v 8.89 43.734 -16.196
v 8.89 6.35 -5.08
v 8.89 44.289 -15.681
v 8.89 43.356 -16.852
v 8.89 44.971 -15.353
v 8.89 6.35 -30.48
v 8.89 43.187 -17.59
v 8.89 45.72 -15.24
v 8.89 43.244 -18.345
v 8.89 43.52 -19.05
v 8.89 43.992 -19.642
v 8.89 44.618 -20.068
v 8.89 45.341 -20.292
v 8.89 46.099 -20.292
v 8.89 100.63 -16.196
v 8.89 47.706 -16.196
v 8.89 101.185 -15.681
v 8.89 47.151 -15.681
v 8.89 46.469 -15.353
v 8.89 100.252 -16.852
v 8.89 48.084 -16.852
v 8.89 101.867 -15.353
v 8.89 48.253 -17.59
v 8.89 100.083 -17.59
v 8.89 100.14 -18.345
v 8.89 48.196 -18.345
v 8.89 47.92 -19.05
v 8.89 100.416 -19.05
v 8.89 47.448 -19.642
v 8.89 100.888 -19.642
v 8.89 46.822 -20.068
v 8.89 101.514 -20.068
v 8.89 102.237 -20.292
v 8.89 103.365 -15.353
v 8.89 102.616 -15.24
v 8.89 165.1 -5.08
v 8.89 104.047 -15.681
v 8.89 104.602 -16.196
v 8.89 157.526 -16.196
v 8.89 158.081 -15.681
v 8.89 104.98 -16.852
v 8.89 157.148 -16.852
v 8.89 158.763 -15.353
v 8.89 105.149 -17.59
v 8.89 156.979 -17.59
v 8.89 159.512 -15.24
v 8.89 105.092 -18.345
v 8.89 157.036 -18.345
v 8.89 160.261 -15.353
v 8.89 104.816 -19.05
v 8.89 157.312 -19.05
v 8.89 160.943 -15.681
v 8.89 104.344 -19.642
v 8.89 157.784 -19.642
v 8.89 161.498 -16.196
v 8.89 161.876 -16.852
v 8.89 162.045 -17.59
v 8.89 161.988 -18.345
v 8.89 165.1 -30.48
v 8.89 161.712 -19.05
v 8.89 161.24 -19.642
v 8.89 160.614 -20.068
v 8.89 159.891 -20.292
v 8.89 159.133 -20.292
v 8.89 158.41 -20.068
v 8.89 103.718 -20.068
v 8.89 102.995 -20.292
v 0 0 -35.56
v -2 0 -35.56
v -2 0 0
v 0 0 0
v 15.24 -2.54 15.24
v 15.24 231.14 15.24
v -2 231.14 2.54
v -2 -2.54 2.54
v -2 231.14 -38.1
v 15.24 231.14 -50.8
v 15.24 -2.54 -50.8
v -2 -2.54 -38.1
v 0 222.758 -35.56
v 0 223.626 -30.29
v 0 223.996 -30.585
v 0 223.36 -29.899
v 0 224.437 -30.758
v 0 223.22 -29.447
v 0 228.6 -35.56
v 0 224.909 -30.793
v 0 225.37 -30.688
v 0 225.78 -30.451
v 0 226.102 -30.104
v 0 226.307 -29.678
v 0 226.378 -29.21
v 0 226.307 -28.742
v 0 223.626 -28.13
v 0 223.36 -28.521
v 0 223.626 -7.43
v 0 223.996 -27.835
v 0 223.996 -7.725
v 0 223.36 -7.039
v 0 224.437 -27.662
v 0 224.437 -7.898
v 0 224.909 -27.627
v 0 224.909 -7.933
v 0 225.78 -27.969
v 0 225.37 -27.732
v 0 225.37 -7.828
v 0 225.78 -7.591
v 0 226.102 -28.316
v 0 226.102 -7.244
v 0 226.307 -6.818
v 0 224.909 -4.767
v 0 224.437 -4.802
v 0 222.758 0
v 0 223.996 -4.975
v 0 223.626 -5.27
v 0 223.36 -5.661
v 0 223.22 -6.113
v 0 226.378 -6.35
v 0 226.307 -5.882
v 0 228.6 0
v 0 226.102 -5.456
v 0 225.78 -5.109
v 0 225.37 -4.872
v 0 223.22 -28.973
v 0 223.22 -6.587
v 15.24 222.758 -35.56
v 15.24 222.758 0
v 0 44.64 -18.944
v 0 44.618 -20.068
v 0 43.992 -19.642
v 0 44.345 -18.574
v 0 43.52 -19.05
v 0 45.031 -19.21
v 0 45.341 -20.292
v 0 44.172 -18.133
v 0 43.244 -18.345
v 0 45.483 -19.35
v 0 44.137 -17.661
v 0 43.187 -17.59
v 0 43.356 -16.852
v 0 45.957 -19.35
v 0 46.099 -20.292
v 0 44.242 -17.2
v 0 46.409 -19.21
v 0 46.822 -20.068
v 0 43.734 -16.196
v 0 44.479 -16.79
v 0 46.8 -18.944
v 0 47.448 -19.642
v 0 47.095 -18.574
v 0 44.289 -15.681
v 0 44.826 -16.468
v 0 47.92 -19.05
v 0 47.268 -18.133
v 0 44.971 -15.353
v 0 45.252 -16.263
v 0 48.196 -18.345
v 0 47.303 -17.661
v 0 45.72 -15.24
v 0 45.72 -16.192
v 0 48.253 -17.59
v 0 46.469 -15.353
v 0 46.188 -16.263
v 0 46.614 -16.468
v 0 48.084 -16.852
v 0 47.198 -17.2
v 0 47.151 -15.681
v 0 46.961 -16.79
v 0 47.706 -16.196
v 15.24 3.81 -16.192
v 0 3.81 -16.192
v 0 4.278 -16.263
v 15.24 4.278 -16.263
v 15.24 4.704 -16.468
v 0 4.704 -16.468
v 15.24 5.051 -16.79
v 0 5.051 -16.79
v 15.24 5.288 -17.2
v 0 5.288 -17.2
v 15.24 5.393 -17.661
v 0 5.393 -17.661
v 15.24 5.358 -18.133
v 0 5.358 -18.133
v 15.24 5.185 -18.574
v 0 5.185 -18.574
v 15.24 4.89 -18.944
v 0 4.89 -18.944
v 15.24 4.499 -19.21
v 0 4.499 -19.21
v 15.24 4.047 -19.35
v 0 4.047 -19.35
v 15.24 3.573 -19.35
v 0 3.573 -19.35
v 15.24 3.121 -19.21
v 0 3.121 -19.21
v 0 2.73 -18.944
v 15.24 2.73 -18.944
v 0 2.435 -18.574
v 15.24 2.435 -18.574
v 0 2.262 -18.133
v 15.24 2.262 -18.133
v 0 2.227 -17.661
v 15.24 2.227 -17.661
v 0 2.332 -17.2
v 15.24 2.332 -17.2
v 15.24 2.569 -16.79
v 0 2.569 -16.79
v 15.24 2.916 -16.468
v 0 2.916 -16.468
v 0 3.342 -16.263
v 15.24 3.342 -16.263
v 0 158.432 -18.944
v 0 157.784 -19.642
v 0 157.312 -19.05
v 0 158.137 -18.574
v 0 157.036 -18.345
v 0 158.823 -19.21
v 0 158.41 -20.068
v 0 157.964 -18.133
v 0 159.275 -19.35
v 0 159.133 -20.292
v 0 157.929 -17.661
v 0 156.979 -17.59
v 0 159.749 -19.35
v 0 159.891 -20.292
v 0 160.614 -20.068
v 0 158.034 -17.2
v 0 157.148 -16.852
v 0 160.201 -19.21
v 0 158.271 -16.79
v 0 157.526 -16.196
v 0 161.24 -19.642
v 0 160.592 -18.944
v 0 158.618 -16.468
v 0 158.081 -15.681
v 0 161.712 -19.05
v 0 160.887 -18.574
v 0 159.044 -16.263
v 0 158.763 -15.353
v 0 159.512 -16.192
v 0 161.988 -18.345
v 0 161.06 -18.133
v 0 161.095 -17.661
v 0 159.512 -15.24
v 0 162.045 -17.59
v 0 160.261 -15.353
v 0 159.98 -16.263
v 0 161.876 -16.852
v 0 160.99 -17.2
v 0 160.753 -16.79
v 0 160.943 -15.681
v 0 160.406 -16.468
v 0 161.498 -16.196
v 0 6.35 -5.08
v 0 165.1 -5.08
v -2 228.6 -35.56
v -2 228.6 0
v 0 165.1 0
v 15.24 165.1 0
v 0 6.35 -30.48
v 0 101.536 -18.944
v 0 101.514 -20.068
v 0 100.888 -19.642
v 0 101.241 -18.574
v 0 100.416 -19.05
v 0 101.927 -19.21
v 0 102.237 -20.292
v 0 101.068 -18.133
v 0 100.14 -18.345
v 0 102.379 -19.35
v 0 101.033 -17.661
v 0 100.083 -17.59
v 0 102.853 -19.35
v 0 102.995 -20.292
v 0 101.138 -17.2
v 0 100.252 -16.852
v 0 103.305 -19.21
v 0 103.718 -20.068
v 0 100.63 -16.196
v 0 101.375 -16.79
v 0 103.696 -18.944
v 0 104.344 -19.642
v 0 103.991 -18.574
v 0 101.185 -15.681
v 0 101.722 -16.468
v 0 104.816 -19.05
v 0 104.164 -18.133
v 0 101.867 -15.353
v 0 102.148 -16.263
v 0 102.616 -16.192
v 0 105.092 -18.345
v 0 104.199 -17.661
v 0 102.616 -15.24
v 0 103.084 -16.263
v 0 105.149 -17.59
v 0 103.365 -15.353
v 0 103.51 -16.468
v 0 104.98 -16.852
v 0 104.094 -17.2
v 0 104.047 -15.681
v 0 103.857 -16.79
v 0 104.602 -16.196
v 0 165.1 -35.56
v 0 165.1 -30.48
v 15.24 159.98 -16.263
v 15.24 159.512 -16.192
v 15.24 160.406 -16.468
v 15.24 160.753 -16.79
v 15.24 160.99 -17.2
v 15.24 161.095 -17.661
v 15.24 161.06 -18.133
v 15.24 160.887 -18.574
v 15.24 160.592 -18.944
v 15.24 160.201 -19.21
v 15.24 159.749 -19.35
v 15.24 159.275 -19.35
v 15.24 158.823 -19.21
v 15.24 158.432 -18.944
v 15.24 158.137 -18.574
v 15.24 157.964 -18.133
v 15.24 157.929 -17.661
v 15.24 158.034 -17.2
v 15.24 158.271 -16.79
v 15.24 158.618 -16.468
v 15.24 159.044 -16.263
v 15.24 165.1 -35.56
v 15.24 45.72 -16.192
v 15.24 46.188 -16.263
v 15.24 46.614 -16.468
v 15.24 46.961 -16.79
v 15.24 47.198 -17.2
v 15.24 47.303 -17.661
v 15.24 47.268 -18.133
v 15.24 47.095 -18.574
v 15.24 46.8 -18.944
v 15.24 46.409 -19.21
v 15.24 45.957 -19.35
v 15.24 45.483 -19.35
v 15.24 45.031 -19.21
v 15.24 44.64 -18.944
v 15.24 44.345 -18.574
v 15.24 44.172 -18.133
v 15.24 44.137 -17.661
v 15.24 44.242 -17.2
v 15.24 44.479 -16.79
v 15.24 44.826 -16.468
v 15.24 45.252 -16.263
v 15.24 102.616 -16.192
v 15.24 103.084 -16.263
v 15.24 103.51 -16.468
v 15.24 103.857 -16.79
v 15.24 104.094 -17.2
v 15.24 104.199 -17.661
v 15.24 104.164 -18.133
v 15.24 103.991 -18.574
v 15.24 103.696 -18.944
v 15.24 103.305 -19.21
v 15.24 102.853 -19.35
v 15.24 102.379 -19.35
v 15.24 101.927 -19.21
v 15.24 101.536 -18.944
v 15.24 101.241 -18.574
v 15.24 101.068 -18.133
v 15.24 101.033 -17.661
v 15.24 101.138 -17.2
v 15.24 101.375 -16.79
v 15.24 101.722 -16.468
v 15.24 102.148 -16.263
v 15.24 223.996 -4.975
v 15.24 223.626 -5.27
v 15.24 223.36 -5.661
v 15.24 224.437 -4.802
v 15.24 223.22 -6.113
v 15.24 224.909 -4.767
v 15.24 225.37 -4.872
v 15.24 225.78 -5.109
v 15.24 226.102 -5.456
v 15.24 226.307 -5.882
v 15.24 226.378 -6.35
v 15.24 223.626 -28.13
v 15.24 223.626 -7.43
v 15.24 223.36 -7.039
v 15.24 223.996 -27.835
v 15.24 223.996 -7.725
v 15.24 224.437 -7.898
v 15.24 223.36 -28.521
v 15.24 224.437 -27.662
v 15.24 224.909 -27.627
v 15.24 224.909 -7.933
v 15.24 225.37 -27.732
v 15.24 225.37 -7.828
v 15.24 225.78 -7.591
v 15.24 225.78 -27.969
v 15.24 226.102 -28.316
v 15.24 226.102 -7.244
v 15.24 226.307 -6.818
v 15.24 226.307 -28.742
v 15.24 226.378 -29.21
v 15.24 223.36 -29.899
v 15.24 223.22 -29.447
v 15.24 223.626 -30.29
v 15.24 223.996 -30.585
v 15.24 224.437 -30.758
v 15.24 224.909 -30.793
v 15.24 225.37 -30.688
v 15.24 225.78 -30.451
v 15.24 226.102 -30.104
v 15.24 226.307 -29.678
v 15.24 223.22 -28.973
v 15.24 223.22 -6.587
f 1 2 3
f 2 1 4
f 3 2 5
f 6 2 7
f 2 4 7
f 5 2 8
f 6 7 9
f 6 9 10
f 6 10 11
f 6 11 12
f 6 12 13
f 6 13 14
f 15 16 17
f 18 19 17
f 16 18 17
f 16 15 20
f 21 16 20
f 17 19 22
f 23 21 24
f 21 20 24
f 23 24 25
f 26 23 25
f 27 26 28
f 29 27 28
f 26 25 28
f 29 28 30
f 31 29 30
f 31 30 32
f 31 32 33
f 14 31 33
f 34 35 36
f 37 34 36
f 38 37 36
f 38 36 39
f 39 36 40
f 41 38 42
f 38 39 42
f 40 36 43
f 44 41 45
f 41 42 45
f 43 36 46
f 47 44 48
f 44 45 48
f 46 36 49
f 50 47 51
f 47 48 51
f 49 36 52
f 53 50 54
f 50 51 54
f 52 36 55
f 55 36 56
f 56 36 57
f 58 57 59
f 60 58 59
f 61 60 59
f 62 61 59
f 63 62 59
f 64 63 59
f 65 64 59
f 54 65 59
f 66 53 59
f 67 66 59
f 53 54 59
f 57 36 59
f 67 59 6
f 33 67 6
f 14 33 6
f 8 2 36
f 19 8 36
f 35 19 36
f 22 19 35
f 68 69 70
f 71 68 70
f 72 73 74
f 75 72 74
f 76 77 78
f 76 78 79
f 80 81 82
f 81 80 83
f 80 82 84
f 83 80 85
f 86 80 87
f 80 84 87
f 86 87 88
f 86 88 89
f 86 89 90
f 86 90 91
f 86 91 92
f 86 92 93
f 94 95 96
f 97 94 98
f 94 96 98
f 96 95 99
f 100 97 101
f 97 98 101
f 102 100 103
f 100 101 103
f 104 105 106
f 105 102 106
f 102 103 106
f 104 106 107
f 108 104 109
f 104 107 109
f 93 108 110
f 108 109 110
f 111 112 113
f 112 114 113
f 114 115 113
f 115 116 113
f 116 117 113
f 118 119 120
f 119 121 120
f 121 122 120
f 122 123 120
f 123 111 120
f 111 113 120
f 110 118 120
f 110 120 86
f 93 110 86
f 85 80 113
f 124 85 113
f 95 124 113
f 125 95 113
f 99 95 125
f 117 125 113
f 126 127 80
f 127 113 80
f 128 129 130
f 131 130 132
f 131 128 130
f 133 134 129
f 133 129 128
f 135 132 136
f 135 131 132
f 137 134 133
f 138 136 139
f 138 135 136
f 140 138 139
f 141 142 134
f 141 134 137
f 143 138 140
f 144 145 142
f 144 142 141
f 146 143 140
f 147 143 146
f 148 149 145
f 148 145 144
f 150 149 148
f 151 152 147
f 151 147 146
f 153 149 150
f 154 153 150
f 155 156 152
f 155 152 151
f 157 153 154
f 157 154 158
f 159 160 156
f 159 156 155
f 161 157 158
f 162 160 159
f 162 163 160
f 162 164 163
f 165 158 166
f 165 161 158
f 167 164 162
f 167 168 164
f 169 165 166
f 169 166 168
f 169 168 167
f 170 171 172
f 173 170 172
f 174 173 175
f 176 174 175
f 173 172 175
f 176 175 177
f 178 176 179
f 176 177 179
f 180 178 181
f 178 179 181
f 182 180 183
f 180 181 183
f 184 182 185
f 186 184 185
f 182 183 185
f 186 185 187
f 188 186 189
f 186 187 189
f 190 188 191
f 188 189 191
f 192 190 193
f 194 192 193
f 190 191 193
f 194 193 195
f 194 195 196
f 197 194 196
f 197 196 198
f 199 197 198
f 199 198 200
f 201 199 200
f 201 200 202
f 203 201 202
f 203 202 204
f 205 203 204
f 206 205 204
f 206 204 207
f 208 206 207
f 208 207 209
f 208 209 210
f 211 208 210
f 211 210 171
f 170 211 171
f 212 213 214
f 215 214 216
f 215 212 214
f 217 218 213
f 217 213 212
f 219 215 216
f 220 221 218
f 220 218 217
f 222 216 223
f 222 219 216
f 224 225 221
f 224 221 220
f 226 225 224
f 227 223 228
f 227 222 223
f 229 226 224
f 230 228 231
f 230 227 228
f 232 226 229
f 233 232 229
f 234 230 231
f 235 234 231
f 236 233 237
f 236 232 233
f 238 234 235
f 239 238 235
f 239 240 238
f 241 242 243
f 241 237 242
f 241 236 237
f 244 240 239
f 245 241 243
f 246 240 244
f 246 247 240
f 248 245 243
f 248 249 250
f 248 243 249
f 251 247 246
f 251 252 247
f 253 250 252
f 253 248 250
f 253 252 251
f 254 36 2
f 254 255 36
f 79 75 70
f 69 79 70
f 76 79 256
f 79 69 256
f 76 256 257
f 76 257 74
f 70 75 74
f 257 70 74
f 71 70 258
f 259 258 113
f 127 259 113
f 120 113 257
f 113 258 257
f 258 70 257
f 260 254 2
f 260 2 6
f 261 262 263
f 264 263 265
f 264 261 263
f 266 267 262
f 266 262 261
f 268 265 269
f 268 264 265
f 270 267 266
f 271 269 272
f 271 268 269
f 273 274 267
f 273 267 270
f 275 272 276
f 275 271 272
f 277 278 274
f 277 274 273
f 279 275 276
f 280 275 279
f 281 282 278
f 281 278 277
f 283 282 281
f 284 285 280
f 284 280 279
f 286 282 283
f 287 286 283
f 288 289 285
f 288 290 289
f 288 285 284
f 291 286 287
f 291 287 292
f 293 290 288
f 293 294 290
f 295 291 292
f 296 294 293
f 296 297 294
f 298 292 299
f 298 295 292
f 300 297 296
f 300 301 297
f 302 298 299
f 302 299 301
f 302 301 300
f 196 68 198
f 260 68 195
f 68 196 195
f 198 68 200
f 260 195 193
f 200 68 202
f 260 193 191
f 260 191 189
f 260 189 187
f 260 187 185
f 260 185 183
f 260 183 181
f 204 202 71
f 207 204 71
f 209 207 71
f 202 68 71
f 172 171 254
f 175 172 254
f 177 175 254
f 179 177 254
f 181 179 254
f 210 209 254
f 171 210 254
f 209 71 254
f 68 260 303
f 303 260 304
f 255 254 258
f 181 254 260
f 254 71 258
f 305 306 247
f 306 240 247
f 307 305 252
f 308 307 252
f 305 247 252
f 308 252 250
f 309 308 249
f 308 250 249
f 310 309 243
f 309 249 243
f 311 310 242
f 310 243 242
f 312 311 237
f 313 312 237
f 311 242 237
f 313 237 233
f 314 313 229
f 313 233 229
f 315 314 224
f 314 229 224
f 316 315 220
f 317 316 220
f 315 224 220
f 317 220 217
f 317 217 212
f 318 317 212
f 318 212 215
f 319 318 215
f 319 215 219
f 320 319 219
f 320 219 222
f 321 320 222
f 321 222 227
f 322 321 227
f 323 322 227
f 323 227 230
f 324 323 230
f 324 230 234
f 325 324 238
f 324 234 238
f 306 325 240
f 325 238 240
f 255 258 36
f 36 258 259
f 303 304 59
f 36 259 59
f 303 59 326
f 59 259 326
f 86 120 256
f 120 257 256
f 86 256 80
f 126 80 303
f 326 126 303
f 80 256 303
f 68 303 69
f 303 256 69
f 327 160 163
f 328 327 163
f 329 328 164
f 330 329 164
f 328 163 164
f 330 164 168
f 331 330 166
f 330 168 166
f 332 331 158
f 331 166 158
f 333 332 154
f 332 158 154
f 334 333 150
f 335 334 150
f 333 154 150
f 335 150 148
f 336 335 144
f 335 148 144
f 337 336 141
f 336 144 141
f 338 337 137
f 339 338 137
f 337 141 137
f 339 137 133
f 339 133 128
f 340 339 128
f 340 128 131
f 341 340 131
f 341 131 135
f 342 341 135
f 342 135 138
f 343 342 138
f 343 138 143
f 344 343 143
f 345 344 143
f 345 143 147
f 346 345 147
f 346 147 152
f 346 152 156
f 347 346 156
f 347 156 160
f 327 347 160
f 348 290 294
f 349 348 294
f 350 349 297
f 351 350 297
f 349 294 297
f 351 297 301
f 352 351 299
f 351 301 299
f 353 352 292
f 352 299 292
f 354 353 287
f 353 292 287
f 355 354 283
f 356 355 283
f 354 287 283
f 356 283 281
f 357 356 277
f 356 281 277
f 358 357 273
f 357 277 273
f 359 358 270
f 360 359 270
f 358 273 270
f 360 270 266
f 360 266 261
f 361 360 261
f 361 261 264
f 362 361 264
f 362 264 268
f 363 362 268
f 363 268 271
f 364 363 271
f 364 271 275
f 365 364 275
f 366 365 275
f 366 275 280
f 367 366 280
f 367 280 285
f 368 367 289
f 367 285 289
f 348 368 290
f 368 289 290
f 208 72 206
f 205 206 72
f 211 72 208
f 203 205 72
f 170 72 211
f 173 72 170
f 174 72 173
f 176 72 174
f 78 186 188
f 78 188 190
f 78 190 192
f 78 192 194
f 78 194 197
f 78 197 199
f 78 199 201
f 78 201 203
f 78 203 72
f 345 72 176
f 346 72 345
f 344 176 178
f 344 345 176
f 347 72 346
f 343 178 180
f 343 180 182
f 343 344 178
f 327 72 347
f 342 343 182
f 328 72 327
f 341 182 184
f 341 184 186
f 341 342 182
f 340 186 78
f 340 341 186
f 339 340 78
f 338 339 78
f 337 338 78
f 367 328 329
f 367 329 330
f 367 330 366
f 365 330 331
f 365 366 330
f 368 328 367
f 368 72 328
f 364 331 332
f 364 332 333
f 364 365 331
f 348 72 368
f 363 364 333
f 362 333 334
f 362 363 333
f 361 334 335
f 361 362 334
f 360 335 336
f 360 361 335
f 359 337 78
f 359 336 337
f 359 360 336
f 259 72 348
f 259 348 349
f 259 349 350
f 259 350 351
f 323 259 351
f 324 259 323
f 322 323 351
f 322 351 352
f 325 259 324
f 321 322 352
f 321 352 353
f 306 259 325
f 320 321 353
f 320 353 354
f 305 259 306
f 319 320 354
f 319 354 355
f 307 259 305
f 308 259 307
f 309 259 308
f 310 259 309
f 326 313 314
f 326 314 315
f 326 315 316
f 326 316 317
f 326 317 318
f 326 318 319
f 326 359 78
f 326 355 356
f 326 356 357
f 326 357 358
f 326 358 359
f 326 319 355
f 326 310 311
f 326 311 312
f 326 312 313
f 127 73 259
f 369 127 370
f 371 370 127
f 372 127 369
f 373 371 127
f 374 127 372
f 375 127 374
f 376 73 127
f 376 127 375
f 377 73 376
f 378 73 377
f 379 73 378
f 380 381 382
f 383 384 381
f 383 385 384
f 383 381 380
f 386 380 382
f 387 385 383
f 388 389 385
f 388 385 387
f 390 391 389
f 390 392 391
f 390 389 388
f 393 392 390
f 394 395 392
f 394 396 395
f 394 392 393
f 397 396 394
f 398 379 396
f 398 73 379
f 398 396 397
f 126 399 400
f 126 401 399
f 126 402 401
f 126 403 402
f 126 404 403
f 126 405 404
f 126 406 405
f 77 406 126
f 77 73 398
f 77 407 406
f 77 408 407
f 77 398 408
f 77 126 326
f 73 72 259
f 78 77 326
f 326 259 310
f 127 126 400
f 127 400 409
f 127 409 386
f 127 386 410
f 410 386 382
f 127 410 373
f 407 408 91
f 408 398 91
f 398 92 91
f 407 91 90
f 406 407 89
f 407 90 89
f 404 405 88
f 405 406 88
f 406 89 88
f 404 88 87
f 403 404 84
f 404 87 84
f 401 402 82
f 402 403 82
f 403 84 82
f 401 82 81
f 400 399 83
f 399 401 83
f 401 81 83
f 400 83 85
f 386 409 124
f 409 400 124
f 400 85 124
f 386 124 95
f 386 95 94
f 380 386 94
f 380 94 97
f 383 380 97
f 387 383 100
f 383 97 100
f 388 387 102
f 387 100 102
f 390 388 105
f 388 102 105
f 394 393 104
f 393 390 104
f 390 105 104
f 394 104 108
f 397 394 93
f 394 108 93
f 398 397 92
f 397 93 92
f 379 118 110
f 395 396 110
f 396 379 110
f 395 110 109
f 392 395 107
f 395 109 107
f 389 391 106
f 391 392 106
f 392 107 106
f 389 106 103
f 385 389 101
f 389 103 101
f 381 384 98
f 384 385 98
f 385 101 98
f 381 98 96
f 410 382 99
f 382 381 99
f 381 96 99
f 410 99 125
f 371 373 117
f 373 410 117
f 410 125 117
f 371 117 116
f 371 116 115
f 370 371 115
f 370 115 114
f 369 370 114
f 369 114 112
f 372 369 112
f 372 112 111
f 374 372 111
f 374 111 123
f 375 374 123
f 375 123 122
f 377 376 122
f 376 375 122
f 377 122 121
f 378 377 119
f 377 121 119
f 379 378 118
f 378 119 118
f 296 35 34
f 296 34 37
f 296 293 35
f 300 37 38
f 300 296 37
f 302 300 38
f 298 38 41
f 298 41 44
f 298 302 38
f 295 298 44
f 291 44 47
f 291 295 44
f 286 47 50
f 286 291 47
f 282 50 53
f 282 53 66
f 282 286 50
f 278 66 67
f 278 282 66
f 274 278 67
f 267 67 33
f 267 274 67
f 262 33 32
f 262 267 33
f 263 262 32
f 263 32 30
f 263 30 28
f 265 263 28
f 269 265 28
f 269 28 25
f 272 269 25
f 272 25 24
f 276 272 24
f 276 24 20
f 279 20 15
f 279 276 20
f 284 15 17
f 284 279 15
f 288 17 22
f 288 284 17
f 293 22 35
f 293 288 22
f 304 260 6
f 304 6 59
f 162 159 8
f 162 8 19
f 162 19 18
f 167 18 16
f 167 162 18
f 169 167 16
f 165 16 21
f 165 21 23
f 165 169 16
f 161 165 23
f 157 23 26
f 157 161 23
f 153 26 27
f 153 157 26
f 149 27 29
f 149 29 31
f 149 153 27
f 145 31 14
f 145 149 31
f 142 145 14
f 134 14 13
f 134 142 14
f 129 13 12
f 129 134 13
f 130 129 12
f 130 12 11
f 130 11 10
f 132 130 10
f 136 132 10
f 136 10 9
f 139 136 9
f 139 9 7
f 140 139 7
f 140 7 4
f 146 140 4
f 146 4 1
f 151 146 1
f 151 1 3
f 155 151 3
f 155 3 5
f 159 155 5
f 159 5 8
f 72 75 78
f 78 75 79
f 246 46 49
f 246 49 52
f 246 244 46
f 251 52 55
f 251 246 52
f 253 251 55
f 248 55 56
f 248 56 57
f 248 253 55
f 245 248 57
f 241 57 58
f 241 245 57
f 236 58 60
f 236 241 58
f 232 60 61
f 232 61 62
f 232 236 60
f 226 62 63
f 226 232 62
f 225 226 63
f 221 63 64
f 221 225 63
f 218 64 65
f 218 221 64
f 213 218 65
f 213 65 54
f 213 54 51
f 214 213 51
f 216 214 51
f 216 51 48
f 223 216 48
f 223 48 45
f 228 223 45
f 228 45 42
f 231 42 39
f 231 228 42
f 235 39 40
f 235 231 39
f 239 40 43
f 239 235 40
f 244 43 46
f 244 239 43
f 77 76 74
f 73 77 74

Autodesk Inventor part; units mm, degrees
ref_plane "YZ Plane" through (0, 0, 0) normal (1, 0, 0) x (0, 1, 0)
ref_plane "XZ Plane" through (0, 0, 0) normal (0, 1, 0) x (-1, 0, 0)
ref_plane "XY Plane" through (0, 0, 0) normal (0, 0, 1) x (1, 0, 0)
sketch "Sketch1" plane through (0, 0, 0) normal (1, 0, 0) x (0, 1, 0)
  line L0 (0, 0) -> (228.6, 0)
  line L1 (228.6, 0) -> (228.6, -35.56)
  line L2 (228.6, -35.56) -> (0, -35.56)
  line L3 (0, -35.56) -> (0, 0)
  line L4 (228.6, 0) -> (222.758, 0)
  line L5 (222.758, 0) -> (222.758, -35.56)
  line L6 (222.758, -35.56) -> (228.6, -35.56)
  line L7 (228.6, -35.56) -> (228.6, 0)
  circle A0 centre (224.79, -6.35) radius 1.5875
  circle A1 centre (224.79, -29.21) radius 1.5875
  line L8 (222.758, 0) -> (0, 0)
  line L9 (165.1, -5.08) -> (6.35, -5.08)
  line L10 (6.35, -5.08) -> (6.35, -30.48)
  line L11 (6.35, -30.48) -> (165.1, -30.48)
  line L12 (222.758, -33.02) -> (222.758, -2.54)
  line L13 (165.1, 0) -> (165.1, -35.56)
  line L14 (231.14, 2.54) -> (-2.54, 2.54)
  line L15 (-2.54, 2.54) -> (-2.54, -38.1)
  line L16 (-2.54, -38.1) -> (231.14, -38.1)
  line L17 (231.14, -38.1) -> (231.14, 2.54)
  point P0 (110.998, 0)
  point P1 (228.6, -17.78)
  dimension "d0" = 228.6
  dimension "d1" = 35.56
  dimension "d2" = 5.842
  dimension "d3" = 3.175
  dimension "d4" = 3.175
  dimension "d5" = 3.81
  dimension "d6" = 6.35
  dimension "d7" = 3.81
  dimension "d8" = 6.35
  dimension "d14" = 5.08
  dimension "d15" = 5.08
  dimension "d16" = 6.35
  dimension "d17" = 0
  dimension "d18" = 63.5
  dimension "d19" = 2.54
  dimension "d20" = 2.54
  dimension "d21" = 2.54
  dimension "d22" = 2.54
extrude "Extrusion1" add sketch "Sketch1" along normal blind 15.24 contours L0 L13 L9 L10 L11 L2 L3 | L0 L1 L2 L5
extrude "Extrusion2" add sketch "Sketch1" along normal blind 15.24 and the other way blind 2 contours L17 L16 L15 L14
sketch "Sketch2" plane through (15.24, 0, 0) normal (1, 0, 0) x (0, 0, -1)
  line L0 (5.08, 6.35) -> (5.08, 165.1) projected
  line L1 (30.48, 165.1) -> (30.48, 6.35) projected
  line L2 (30.48, 6.35) -> (5.08, 6.35) projected
  line L3 (5.08, 165.1) -> (30.48, 165.1)
  point P0 (0, 0)
extrude "Extrusion3" add sketch "Sketch2" against normal blind 6.35
sketch "Sketch3" plane through (0, 0, 0) normal (-1, 0, 0) x (0, 0, 1)
  circle A0 centre (-17.78, 45.72) radius 2.54
  circle A1 centre (-17.78, 45.72) radius 1.5875
  line L0 (0, 228.6) -> (0, 0) projected
  line L1 (0, 0) -> (-35.56, 0) projected
  circle A2 centre (-17.78, 102.616) radius 2.54
  circle A3 centre (-17.78, 102.616) radius 1.5875
  circle A4 centre (-17.78, 159.512) radius 2.54
  circle A5 centre (-17.78, 159.512) radius 1.5875
  circle A6 centre (-17.78, 3.81) radius 1.5875
  dimension "d29" = 5.08
  dimension "d30" = 3.175
  dimension "d31" = 17.78
  dimension "d32" = 45.72
  dimension "d33" = 5.08
  dimension "d34" = 3.175
  dimension "d35" = 102.616
  dimension "d36" = 5.08
  dimension "d37" = 3.175
  dimension "d38" = 159.512
  dimension "d39" = 17.78
  dimension "d40" = 17.78
  dimension "d42" = 3.175
extrude "Extrusion4" add sketch "Sketch3" against normal up to surface (8.89 mm away) contours A0 | A2 | A4
extrude "Extrusion5" cut sketch "Sketch3" against normal through all contours A1 | A3 | A5 | A6
sketch "Sketch4" plane through (-2, 231.14, 2.54) normal (0, 1, 0) x (1, 0, 0)
  line L0 (17.24, 40.64) -> (17.24, 0) projected
  line L1 (17.24, 0) -> (17.24, -12.7)
  line L2 (17.24, -12.7) -> (0, 0)
  line L3 (17.24, 40.64) -> (17.24, 53.34)
  line L4 (0, 40.64) -> (17.24, 40.64) projected
  line L5 (17.24, 53.34) -> (0, 40.64)
  line L6 (0, 0) -> (17.24, 0) projected
  point P0 (2, 2.54)
  dimension "d48" = 12.7
  dimension "d49" = 12.7
extrude "Extrusion6" add sketch "Sketch4" against normal up to surface (233.68 mm away)
properties part number "Fullenss sensor v3.1 holder"
